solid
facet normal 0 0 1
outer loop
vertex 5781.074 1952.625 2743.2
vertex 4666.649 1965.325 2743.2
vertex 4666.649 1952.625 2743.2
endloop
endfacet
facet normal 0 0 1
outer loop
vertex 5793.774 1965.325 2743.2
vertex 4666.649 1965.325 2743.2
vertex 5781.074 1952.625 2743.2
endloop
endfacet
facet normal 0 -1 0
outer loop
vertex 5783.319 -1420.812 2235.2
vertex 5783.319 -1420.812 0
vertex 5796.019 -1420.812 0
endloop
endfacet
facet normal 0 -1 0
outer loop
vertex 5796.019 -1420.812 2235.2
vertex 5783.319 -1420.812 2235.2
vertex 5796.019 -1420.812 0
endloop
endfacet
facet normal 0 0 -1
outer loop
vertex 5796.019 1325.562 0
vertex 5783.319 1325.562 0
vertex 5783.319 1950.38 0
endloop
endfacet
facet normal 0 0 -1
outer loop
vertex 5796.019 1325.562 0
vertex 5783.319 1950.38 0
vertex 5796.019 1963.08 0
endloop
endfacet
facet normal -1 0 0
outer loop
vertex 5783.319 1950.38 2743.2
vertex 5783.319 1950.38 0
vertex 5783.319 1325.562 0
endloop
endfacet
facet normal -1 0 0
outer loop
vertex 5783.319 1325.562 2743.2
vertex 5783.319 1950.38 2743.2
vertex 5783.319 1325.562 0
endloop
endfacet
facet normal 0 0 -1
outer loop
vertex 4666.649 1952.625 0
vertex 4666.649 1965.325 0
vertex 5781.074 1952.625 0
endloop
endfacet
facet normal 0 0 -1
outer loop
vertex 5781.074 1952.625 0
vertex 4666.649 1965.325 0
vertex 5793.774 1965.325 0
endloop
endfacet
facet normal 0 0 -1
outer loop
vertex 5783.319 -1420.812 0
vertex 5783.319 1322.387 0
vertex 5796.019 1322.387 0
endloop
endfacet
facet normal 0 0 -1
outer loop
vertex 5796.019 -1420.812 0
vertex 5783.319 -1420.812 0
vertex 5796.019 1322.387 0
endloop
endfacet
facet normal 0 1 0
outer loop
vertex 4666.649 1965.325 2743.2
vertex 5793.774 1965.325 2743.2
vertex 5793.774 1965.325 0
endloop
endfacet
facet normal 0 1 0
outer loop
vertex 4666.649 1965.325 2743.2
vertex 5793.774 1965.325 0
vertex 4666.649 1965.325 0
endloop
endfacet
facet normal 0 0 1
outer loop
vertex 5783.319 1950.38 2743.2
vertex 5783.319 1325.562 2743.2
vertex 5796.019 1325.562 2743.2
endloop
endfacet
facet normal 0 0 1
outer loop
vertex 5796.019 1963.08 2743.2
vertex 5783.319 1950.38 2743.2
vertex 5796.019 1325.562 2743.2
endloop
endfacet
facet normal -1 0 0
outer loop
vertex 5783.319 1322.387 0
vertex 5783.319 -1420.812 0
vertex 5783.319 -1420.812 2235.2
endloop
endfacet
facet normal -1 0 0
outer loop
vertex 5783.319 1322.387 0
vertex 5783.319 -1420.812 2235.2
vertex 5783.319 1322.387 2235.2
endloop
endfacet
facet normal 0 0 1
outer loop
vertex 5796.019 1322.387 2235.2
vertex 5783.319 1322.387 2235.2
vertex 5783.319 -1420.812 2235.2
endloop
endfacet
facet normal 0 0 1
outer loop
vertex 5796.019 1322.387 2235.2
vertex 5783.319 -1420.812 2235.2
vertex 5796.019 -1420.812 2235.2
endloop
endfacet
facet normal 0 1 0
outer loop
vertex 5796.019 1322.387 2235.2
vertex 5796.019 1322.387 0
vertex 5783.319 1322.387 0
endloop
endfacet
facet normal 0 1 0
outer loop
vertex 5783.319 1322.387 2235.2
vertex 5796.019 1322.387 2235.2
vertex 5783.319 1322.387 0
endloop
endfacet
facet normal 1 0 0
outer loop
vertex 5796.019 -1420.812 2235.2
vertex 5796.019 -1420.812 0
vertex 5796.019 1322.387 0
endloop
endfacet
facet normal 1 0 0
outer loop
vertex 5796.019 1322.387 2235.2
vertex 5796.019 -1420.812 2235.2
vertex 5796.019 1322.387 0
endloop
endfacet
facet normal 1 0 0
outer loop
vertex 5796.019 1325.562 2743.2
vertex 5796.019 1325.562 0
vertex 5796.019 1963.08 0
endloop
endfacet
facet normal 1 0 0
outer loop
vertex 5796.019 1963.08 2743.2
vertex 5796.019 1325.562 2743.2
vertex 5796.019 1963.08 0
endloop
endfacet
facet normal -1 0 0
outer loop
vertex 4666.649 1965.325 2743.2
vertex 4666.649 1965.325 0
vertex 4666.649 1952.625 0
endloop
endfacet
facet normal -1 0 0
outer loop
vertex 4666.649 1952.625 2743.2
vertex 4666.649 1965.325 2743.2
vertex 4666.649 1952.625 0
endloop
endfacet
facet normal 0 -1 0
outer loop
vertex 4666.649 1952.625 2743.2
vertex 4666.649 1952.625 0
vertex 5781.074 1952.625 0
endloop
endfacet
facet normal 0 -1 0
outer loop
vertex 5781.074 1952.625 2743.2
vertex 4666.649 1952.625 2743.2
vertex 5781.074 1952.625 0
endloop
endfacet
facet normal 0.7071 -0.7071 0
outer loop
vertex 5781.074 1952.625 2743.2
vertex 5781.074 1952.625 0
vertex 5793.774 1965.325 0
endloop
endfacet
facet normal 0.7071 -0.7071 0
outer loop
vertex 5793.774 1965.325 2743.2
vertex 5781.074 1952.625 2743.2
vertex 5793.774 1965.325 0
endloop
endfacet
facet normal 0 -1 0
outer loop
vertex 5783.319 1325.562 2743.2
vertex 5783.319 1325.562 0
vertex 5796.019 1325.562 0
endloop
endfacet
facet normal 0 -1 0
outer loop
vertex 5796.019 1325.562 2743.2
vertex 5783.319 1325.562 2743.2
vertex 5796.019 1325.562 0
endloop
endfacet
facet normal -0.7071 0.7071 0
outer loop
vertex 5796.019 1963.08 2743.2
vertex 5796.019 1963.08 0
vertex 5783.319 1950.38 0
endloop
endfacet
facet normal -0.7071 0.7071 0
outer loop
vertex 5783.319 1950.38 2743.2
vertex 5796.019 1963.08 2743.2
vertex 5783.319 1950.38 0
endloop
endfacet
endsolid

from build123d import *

# Parameters (mm, degrees)
F1_DEPTH = 2743.2
F2_DEPTH = 2743.2
F0_W     = 6.35
F0_H     = 2743.2
F3_DEPTH = 2235.2


with BuildPart() as f1:
    # F0 (on Top) → F1 (new body)
    with BuildSketch(Plane.XY):
        Polygon((5787.424087, 1958.975), (4666.649087, 1958.975), (4666.649087, 1952.625), (5781.074087, 1952.625), align=None)
        Polygon((5789.669142, 1961.220055), (5793.774087, 1965.325), (4666.649087, 1965.325), (4666.649087, 1958.975), (5787.424087, 1958.975), align=None)
    extrude(amount=F1_DEPTH)


with BuildPart() as f2:
    # F0 (on Top) → F2 (new body)
    with BuildSketch(Plane.XY):
        Polygon((5789.669142, 1325.5625), (5789.669142, 1956.729945), (5783.319142, 1950.379945), (5783.319142, 1325.5625), align=None)
        Polygon((5791.914197, 1958.975), (5789.669142, 1956.729945), (5789.669142, 1325.5625), (5796.019142, 1325.5625), (5796.019142, 1963.079945), align=None)
    extrude(amount=F2_DEPTH)


with BuildPart() as f3:
    # F0 (on Top) → F3 (new body)
    with BuildSketch(Plane.XY):
        with Locations((5786.494142, -49.2125)):
            Rectangle(F0_W, F0_H)
        with Locations((5792.844142, -49.2125)):
            Rectangle(F0_W, F0_H)
    extrude(amount=F3_DEPTH)


solid = Compound([f1.part, f2.part, f3.part])
